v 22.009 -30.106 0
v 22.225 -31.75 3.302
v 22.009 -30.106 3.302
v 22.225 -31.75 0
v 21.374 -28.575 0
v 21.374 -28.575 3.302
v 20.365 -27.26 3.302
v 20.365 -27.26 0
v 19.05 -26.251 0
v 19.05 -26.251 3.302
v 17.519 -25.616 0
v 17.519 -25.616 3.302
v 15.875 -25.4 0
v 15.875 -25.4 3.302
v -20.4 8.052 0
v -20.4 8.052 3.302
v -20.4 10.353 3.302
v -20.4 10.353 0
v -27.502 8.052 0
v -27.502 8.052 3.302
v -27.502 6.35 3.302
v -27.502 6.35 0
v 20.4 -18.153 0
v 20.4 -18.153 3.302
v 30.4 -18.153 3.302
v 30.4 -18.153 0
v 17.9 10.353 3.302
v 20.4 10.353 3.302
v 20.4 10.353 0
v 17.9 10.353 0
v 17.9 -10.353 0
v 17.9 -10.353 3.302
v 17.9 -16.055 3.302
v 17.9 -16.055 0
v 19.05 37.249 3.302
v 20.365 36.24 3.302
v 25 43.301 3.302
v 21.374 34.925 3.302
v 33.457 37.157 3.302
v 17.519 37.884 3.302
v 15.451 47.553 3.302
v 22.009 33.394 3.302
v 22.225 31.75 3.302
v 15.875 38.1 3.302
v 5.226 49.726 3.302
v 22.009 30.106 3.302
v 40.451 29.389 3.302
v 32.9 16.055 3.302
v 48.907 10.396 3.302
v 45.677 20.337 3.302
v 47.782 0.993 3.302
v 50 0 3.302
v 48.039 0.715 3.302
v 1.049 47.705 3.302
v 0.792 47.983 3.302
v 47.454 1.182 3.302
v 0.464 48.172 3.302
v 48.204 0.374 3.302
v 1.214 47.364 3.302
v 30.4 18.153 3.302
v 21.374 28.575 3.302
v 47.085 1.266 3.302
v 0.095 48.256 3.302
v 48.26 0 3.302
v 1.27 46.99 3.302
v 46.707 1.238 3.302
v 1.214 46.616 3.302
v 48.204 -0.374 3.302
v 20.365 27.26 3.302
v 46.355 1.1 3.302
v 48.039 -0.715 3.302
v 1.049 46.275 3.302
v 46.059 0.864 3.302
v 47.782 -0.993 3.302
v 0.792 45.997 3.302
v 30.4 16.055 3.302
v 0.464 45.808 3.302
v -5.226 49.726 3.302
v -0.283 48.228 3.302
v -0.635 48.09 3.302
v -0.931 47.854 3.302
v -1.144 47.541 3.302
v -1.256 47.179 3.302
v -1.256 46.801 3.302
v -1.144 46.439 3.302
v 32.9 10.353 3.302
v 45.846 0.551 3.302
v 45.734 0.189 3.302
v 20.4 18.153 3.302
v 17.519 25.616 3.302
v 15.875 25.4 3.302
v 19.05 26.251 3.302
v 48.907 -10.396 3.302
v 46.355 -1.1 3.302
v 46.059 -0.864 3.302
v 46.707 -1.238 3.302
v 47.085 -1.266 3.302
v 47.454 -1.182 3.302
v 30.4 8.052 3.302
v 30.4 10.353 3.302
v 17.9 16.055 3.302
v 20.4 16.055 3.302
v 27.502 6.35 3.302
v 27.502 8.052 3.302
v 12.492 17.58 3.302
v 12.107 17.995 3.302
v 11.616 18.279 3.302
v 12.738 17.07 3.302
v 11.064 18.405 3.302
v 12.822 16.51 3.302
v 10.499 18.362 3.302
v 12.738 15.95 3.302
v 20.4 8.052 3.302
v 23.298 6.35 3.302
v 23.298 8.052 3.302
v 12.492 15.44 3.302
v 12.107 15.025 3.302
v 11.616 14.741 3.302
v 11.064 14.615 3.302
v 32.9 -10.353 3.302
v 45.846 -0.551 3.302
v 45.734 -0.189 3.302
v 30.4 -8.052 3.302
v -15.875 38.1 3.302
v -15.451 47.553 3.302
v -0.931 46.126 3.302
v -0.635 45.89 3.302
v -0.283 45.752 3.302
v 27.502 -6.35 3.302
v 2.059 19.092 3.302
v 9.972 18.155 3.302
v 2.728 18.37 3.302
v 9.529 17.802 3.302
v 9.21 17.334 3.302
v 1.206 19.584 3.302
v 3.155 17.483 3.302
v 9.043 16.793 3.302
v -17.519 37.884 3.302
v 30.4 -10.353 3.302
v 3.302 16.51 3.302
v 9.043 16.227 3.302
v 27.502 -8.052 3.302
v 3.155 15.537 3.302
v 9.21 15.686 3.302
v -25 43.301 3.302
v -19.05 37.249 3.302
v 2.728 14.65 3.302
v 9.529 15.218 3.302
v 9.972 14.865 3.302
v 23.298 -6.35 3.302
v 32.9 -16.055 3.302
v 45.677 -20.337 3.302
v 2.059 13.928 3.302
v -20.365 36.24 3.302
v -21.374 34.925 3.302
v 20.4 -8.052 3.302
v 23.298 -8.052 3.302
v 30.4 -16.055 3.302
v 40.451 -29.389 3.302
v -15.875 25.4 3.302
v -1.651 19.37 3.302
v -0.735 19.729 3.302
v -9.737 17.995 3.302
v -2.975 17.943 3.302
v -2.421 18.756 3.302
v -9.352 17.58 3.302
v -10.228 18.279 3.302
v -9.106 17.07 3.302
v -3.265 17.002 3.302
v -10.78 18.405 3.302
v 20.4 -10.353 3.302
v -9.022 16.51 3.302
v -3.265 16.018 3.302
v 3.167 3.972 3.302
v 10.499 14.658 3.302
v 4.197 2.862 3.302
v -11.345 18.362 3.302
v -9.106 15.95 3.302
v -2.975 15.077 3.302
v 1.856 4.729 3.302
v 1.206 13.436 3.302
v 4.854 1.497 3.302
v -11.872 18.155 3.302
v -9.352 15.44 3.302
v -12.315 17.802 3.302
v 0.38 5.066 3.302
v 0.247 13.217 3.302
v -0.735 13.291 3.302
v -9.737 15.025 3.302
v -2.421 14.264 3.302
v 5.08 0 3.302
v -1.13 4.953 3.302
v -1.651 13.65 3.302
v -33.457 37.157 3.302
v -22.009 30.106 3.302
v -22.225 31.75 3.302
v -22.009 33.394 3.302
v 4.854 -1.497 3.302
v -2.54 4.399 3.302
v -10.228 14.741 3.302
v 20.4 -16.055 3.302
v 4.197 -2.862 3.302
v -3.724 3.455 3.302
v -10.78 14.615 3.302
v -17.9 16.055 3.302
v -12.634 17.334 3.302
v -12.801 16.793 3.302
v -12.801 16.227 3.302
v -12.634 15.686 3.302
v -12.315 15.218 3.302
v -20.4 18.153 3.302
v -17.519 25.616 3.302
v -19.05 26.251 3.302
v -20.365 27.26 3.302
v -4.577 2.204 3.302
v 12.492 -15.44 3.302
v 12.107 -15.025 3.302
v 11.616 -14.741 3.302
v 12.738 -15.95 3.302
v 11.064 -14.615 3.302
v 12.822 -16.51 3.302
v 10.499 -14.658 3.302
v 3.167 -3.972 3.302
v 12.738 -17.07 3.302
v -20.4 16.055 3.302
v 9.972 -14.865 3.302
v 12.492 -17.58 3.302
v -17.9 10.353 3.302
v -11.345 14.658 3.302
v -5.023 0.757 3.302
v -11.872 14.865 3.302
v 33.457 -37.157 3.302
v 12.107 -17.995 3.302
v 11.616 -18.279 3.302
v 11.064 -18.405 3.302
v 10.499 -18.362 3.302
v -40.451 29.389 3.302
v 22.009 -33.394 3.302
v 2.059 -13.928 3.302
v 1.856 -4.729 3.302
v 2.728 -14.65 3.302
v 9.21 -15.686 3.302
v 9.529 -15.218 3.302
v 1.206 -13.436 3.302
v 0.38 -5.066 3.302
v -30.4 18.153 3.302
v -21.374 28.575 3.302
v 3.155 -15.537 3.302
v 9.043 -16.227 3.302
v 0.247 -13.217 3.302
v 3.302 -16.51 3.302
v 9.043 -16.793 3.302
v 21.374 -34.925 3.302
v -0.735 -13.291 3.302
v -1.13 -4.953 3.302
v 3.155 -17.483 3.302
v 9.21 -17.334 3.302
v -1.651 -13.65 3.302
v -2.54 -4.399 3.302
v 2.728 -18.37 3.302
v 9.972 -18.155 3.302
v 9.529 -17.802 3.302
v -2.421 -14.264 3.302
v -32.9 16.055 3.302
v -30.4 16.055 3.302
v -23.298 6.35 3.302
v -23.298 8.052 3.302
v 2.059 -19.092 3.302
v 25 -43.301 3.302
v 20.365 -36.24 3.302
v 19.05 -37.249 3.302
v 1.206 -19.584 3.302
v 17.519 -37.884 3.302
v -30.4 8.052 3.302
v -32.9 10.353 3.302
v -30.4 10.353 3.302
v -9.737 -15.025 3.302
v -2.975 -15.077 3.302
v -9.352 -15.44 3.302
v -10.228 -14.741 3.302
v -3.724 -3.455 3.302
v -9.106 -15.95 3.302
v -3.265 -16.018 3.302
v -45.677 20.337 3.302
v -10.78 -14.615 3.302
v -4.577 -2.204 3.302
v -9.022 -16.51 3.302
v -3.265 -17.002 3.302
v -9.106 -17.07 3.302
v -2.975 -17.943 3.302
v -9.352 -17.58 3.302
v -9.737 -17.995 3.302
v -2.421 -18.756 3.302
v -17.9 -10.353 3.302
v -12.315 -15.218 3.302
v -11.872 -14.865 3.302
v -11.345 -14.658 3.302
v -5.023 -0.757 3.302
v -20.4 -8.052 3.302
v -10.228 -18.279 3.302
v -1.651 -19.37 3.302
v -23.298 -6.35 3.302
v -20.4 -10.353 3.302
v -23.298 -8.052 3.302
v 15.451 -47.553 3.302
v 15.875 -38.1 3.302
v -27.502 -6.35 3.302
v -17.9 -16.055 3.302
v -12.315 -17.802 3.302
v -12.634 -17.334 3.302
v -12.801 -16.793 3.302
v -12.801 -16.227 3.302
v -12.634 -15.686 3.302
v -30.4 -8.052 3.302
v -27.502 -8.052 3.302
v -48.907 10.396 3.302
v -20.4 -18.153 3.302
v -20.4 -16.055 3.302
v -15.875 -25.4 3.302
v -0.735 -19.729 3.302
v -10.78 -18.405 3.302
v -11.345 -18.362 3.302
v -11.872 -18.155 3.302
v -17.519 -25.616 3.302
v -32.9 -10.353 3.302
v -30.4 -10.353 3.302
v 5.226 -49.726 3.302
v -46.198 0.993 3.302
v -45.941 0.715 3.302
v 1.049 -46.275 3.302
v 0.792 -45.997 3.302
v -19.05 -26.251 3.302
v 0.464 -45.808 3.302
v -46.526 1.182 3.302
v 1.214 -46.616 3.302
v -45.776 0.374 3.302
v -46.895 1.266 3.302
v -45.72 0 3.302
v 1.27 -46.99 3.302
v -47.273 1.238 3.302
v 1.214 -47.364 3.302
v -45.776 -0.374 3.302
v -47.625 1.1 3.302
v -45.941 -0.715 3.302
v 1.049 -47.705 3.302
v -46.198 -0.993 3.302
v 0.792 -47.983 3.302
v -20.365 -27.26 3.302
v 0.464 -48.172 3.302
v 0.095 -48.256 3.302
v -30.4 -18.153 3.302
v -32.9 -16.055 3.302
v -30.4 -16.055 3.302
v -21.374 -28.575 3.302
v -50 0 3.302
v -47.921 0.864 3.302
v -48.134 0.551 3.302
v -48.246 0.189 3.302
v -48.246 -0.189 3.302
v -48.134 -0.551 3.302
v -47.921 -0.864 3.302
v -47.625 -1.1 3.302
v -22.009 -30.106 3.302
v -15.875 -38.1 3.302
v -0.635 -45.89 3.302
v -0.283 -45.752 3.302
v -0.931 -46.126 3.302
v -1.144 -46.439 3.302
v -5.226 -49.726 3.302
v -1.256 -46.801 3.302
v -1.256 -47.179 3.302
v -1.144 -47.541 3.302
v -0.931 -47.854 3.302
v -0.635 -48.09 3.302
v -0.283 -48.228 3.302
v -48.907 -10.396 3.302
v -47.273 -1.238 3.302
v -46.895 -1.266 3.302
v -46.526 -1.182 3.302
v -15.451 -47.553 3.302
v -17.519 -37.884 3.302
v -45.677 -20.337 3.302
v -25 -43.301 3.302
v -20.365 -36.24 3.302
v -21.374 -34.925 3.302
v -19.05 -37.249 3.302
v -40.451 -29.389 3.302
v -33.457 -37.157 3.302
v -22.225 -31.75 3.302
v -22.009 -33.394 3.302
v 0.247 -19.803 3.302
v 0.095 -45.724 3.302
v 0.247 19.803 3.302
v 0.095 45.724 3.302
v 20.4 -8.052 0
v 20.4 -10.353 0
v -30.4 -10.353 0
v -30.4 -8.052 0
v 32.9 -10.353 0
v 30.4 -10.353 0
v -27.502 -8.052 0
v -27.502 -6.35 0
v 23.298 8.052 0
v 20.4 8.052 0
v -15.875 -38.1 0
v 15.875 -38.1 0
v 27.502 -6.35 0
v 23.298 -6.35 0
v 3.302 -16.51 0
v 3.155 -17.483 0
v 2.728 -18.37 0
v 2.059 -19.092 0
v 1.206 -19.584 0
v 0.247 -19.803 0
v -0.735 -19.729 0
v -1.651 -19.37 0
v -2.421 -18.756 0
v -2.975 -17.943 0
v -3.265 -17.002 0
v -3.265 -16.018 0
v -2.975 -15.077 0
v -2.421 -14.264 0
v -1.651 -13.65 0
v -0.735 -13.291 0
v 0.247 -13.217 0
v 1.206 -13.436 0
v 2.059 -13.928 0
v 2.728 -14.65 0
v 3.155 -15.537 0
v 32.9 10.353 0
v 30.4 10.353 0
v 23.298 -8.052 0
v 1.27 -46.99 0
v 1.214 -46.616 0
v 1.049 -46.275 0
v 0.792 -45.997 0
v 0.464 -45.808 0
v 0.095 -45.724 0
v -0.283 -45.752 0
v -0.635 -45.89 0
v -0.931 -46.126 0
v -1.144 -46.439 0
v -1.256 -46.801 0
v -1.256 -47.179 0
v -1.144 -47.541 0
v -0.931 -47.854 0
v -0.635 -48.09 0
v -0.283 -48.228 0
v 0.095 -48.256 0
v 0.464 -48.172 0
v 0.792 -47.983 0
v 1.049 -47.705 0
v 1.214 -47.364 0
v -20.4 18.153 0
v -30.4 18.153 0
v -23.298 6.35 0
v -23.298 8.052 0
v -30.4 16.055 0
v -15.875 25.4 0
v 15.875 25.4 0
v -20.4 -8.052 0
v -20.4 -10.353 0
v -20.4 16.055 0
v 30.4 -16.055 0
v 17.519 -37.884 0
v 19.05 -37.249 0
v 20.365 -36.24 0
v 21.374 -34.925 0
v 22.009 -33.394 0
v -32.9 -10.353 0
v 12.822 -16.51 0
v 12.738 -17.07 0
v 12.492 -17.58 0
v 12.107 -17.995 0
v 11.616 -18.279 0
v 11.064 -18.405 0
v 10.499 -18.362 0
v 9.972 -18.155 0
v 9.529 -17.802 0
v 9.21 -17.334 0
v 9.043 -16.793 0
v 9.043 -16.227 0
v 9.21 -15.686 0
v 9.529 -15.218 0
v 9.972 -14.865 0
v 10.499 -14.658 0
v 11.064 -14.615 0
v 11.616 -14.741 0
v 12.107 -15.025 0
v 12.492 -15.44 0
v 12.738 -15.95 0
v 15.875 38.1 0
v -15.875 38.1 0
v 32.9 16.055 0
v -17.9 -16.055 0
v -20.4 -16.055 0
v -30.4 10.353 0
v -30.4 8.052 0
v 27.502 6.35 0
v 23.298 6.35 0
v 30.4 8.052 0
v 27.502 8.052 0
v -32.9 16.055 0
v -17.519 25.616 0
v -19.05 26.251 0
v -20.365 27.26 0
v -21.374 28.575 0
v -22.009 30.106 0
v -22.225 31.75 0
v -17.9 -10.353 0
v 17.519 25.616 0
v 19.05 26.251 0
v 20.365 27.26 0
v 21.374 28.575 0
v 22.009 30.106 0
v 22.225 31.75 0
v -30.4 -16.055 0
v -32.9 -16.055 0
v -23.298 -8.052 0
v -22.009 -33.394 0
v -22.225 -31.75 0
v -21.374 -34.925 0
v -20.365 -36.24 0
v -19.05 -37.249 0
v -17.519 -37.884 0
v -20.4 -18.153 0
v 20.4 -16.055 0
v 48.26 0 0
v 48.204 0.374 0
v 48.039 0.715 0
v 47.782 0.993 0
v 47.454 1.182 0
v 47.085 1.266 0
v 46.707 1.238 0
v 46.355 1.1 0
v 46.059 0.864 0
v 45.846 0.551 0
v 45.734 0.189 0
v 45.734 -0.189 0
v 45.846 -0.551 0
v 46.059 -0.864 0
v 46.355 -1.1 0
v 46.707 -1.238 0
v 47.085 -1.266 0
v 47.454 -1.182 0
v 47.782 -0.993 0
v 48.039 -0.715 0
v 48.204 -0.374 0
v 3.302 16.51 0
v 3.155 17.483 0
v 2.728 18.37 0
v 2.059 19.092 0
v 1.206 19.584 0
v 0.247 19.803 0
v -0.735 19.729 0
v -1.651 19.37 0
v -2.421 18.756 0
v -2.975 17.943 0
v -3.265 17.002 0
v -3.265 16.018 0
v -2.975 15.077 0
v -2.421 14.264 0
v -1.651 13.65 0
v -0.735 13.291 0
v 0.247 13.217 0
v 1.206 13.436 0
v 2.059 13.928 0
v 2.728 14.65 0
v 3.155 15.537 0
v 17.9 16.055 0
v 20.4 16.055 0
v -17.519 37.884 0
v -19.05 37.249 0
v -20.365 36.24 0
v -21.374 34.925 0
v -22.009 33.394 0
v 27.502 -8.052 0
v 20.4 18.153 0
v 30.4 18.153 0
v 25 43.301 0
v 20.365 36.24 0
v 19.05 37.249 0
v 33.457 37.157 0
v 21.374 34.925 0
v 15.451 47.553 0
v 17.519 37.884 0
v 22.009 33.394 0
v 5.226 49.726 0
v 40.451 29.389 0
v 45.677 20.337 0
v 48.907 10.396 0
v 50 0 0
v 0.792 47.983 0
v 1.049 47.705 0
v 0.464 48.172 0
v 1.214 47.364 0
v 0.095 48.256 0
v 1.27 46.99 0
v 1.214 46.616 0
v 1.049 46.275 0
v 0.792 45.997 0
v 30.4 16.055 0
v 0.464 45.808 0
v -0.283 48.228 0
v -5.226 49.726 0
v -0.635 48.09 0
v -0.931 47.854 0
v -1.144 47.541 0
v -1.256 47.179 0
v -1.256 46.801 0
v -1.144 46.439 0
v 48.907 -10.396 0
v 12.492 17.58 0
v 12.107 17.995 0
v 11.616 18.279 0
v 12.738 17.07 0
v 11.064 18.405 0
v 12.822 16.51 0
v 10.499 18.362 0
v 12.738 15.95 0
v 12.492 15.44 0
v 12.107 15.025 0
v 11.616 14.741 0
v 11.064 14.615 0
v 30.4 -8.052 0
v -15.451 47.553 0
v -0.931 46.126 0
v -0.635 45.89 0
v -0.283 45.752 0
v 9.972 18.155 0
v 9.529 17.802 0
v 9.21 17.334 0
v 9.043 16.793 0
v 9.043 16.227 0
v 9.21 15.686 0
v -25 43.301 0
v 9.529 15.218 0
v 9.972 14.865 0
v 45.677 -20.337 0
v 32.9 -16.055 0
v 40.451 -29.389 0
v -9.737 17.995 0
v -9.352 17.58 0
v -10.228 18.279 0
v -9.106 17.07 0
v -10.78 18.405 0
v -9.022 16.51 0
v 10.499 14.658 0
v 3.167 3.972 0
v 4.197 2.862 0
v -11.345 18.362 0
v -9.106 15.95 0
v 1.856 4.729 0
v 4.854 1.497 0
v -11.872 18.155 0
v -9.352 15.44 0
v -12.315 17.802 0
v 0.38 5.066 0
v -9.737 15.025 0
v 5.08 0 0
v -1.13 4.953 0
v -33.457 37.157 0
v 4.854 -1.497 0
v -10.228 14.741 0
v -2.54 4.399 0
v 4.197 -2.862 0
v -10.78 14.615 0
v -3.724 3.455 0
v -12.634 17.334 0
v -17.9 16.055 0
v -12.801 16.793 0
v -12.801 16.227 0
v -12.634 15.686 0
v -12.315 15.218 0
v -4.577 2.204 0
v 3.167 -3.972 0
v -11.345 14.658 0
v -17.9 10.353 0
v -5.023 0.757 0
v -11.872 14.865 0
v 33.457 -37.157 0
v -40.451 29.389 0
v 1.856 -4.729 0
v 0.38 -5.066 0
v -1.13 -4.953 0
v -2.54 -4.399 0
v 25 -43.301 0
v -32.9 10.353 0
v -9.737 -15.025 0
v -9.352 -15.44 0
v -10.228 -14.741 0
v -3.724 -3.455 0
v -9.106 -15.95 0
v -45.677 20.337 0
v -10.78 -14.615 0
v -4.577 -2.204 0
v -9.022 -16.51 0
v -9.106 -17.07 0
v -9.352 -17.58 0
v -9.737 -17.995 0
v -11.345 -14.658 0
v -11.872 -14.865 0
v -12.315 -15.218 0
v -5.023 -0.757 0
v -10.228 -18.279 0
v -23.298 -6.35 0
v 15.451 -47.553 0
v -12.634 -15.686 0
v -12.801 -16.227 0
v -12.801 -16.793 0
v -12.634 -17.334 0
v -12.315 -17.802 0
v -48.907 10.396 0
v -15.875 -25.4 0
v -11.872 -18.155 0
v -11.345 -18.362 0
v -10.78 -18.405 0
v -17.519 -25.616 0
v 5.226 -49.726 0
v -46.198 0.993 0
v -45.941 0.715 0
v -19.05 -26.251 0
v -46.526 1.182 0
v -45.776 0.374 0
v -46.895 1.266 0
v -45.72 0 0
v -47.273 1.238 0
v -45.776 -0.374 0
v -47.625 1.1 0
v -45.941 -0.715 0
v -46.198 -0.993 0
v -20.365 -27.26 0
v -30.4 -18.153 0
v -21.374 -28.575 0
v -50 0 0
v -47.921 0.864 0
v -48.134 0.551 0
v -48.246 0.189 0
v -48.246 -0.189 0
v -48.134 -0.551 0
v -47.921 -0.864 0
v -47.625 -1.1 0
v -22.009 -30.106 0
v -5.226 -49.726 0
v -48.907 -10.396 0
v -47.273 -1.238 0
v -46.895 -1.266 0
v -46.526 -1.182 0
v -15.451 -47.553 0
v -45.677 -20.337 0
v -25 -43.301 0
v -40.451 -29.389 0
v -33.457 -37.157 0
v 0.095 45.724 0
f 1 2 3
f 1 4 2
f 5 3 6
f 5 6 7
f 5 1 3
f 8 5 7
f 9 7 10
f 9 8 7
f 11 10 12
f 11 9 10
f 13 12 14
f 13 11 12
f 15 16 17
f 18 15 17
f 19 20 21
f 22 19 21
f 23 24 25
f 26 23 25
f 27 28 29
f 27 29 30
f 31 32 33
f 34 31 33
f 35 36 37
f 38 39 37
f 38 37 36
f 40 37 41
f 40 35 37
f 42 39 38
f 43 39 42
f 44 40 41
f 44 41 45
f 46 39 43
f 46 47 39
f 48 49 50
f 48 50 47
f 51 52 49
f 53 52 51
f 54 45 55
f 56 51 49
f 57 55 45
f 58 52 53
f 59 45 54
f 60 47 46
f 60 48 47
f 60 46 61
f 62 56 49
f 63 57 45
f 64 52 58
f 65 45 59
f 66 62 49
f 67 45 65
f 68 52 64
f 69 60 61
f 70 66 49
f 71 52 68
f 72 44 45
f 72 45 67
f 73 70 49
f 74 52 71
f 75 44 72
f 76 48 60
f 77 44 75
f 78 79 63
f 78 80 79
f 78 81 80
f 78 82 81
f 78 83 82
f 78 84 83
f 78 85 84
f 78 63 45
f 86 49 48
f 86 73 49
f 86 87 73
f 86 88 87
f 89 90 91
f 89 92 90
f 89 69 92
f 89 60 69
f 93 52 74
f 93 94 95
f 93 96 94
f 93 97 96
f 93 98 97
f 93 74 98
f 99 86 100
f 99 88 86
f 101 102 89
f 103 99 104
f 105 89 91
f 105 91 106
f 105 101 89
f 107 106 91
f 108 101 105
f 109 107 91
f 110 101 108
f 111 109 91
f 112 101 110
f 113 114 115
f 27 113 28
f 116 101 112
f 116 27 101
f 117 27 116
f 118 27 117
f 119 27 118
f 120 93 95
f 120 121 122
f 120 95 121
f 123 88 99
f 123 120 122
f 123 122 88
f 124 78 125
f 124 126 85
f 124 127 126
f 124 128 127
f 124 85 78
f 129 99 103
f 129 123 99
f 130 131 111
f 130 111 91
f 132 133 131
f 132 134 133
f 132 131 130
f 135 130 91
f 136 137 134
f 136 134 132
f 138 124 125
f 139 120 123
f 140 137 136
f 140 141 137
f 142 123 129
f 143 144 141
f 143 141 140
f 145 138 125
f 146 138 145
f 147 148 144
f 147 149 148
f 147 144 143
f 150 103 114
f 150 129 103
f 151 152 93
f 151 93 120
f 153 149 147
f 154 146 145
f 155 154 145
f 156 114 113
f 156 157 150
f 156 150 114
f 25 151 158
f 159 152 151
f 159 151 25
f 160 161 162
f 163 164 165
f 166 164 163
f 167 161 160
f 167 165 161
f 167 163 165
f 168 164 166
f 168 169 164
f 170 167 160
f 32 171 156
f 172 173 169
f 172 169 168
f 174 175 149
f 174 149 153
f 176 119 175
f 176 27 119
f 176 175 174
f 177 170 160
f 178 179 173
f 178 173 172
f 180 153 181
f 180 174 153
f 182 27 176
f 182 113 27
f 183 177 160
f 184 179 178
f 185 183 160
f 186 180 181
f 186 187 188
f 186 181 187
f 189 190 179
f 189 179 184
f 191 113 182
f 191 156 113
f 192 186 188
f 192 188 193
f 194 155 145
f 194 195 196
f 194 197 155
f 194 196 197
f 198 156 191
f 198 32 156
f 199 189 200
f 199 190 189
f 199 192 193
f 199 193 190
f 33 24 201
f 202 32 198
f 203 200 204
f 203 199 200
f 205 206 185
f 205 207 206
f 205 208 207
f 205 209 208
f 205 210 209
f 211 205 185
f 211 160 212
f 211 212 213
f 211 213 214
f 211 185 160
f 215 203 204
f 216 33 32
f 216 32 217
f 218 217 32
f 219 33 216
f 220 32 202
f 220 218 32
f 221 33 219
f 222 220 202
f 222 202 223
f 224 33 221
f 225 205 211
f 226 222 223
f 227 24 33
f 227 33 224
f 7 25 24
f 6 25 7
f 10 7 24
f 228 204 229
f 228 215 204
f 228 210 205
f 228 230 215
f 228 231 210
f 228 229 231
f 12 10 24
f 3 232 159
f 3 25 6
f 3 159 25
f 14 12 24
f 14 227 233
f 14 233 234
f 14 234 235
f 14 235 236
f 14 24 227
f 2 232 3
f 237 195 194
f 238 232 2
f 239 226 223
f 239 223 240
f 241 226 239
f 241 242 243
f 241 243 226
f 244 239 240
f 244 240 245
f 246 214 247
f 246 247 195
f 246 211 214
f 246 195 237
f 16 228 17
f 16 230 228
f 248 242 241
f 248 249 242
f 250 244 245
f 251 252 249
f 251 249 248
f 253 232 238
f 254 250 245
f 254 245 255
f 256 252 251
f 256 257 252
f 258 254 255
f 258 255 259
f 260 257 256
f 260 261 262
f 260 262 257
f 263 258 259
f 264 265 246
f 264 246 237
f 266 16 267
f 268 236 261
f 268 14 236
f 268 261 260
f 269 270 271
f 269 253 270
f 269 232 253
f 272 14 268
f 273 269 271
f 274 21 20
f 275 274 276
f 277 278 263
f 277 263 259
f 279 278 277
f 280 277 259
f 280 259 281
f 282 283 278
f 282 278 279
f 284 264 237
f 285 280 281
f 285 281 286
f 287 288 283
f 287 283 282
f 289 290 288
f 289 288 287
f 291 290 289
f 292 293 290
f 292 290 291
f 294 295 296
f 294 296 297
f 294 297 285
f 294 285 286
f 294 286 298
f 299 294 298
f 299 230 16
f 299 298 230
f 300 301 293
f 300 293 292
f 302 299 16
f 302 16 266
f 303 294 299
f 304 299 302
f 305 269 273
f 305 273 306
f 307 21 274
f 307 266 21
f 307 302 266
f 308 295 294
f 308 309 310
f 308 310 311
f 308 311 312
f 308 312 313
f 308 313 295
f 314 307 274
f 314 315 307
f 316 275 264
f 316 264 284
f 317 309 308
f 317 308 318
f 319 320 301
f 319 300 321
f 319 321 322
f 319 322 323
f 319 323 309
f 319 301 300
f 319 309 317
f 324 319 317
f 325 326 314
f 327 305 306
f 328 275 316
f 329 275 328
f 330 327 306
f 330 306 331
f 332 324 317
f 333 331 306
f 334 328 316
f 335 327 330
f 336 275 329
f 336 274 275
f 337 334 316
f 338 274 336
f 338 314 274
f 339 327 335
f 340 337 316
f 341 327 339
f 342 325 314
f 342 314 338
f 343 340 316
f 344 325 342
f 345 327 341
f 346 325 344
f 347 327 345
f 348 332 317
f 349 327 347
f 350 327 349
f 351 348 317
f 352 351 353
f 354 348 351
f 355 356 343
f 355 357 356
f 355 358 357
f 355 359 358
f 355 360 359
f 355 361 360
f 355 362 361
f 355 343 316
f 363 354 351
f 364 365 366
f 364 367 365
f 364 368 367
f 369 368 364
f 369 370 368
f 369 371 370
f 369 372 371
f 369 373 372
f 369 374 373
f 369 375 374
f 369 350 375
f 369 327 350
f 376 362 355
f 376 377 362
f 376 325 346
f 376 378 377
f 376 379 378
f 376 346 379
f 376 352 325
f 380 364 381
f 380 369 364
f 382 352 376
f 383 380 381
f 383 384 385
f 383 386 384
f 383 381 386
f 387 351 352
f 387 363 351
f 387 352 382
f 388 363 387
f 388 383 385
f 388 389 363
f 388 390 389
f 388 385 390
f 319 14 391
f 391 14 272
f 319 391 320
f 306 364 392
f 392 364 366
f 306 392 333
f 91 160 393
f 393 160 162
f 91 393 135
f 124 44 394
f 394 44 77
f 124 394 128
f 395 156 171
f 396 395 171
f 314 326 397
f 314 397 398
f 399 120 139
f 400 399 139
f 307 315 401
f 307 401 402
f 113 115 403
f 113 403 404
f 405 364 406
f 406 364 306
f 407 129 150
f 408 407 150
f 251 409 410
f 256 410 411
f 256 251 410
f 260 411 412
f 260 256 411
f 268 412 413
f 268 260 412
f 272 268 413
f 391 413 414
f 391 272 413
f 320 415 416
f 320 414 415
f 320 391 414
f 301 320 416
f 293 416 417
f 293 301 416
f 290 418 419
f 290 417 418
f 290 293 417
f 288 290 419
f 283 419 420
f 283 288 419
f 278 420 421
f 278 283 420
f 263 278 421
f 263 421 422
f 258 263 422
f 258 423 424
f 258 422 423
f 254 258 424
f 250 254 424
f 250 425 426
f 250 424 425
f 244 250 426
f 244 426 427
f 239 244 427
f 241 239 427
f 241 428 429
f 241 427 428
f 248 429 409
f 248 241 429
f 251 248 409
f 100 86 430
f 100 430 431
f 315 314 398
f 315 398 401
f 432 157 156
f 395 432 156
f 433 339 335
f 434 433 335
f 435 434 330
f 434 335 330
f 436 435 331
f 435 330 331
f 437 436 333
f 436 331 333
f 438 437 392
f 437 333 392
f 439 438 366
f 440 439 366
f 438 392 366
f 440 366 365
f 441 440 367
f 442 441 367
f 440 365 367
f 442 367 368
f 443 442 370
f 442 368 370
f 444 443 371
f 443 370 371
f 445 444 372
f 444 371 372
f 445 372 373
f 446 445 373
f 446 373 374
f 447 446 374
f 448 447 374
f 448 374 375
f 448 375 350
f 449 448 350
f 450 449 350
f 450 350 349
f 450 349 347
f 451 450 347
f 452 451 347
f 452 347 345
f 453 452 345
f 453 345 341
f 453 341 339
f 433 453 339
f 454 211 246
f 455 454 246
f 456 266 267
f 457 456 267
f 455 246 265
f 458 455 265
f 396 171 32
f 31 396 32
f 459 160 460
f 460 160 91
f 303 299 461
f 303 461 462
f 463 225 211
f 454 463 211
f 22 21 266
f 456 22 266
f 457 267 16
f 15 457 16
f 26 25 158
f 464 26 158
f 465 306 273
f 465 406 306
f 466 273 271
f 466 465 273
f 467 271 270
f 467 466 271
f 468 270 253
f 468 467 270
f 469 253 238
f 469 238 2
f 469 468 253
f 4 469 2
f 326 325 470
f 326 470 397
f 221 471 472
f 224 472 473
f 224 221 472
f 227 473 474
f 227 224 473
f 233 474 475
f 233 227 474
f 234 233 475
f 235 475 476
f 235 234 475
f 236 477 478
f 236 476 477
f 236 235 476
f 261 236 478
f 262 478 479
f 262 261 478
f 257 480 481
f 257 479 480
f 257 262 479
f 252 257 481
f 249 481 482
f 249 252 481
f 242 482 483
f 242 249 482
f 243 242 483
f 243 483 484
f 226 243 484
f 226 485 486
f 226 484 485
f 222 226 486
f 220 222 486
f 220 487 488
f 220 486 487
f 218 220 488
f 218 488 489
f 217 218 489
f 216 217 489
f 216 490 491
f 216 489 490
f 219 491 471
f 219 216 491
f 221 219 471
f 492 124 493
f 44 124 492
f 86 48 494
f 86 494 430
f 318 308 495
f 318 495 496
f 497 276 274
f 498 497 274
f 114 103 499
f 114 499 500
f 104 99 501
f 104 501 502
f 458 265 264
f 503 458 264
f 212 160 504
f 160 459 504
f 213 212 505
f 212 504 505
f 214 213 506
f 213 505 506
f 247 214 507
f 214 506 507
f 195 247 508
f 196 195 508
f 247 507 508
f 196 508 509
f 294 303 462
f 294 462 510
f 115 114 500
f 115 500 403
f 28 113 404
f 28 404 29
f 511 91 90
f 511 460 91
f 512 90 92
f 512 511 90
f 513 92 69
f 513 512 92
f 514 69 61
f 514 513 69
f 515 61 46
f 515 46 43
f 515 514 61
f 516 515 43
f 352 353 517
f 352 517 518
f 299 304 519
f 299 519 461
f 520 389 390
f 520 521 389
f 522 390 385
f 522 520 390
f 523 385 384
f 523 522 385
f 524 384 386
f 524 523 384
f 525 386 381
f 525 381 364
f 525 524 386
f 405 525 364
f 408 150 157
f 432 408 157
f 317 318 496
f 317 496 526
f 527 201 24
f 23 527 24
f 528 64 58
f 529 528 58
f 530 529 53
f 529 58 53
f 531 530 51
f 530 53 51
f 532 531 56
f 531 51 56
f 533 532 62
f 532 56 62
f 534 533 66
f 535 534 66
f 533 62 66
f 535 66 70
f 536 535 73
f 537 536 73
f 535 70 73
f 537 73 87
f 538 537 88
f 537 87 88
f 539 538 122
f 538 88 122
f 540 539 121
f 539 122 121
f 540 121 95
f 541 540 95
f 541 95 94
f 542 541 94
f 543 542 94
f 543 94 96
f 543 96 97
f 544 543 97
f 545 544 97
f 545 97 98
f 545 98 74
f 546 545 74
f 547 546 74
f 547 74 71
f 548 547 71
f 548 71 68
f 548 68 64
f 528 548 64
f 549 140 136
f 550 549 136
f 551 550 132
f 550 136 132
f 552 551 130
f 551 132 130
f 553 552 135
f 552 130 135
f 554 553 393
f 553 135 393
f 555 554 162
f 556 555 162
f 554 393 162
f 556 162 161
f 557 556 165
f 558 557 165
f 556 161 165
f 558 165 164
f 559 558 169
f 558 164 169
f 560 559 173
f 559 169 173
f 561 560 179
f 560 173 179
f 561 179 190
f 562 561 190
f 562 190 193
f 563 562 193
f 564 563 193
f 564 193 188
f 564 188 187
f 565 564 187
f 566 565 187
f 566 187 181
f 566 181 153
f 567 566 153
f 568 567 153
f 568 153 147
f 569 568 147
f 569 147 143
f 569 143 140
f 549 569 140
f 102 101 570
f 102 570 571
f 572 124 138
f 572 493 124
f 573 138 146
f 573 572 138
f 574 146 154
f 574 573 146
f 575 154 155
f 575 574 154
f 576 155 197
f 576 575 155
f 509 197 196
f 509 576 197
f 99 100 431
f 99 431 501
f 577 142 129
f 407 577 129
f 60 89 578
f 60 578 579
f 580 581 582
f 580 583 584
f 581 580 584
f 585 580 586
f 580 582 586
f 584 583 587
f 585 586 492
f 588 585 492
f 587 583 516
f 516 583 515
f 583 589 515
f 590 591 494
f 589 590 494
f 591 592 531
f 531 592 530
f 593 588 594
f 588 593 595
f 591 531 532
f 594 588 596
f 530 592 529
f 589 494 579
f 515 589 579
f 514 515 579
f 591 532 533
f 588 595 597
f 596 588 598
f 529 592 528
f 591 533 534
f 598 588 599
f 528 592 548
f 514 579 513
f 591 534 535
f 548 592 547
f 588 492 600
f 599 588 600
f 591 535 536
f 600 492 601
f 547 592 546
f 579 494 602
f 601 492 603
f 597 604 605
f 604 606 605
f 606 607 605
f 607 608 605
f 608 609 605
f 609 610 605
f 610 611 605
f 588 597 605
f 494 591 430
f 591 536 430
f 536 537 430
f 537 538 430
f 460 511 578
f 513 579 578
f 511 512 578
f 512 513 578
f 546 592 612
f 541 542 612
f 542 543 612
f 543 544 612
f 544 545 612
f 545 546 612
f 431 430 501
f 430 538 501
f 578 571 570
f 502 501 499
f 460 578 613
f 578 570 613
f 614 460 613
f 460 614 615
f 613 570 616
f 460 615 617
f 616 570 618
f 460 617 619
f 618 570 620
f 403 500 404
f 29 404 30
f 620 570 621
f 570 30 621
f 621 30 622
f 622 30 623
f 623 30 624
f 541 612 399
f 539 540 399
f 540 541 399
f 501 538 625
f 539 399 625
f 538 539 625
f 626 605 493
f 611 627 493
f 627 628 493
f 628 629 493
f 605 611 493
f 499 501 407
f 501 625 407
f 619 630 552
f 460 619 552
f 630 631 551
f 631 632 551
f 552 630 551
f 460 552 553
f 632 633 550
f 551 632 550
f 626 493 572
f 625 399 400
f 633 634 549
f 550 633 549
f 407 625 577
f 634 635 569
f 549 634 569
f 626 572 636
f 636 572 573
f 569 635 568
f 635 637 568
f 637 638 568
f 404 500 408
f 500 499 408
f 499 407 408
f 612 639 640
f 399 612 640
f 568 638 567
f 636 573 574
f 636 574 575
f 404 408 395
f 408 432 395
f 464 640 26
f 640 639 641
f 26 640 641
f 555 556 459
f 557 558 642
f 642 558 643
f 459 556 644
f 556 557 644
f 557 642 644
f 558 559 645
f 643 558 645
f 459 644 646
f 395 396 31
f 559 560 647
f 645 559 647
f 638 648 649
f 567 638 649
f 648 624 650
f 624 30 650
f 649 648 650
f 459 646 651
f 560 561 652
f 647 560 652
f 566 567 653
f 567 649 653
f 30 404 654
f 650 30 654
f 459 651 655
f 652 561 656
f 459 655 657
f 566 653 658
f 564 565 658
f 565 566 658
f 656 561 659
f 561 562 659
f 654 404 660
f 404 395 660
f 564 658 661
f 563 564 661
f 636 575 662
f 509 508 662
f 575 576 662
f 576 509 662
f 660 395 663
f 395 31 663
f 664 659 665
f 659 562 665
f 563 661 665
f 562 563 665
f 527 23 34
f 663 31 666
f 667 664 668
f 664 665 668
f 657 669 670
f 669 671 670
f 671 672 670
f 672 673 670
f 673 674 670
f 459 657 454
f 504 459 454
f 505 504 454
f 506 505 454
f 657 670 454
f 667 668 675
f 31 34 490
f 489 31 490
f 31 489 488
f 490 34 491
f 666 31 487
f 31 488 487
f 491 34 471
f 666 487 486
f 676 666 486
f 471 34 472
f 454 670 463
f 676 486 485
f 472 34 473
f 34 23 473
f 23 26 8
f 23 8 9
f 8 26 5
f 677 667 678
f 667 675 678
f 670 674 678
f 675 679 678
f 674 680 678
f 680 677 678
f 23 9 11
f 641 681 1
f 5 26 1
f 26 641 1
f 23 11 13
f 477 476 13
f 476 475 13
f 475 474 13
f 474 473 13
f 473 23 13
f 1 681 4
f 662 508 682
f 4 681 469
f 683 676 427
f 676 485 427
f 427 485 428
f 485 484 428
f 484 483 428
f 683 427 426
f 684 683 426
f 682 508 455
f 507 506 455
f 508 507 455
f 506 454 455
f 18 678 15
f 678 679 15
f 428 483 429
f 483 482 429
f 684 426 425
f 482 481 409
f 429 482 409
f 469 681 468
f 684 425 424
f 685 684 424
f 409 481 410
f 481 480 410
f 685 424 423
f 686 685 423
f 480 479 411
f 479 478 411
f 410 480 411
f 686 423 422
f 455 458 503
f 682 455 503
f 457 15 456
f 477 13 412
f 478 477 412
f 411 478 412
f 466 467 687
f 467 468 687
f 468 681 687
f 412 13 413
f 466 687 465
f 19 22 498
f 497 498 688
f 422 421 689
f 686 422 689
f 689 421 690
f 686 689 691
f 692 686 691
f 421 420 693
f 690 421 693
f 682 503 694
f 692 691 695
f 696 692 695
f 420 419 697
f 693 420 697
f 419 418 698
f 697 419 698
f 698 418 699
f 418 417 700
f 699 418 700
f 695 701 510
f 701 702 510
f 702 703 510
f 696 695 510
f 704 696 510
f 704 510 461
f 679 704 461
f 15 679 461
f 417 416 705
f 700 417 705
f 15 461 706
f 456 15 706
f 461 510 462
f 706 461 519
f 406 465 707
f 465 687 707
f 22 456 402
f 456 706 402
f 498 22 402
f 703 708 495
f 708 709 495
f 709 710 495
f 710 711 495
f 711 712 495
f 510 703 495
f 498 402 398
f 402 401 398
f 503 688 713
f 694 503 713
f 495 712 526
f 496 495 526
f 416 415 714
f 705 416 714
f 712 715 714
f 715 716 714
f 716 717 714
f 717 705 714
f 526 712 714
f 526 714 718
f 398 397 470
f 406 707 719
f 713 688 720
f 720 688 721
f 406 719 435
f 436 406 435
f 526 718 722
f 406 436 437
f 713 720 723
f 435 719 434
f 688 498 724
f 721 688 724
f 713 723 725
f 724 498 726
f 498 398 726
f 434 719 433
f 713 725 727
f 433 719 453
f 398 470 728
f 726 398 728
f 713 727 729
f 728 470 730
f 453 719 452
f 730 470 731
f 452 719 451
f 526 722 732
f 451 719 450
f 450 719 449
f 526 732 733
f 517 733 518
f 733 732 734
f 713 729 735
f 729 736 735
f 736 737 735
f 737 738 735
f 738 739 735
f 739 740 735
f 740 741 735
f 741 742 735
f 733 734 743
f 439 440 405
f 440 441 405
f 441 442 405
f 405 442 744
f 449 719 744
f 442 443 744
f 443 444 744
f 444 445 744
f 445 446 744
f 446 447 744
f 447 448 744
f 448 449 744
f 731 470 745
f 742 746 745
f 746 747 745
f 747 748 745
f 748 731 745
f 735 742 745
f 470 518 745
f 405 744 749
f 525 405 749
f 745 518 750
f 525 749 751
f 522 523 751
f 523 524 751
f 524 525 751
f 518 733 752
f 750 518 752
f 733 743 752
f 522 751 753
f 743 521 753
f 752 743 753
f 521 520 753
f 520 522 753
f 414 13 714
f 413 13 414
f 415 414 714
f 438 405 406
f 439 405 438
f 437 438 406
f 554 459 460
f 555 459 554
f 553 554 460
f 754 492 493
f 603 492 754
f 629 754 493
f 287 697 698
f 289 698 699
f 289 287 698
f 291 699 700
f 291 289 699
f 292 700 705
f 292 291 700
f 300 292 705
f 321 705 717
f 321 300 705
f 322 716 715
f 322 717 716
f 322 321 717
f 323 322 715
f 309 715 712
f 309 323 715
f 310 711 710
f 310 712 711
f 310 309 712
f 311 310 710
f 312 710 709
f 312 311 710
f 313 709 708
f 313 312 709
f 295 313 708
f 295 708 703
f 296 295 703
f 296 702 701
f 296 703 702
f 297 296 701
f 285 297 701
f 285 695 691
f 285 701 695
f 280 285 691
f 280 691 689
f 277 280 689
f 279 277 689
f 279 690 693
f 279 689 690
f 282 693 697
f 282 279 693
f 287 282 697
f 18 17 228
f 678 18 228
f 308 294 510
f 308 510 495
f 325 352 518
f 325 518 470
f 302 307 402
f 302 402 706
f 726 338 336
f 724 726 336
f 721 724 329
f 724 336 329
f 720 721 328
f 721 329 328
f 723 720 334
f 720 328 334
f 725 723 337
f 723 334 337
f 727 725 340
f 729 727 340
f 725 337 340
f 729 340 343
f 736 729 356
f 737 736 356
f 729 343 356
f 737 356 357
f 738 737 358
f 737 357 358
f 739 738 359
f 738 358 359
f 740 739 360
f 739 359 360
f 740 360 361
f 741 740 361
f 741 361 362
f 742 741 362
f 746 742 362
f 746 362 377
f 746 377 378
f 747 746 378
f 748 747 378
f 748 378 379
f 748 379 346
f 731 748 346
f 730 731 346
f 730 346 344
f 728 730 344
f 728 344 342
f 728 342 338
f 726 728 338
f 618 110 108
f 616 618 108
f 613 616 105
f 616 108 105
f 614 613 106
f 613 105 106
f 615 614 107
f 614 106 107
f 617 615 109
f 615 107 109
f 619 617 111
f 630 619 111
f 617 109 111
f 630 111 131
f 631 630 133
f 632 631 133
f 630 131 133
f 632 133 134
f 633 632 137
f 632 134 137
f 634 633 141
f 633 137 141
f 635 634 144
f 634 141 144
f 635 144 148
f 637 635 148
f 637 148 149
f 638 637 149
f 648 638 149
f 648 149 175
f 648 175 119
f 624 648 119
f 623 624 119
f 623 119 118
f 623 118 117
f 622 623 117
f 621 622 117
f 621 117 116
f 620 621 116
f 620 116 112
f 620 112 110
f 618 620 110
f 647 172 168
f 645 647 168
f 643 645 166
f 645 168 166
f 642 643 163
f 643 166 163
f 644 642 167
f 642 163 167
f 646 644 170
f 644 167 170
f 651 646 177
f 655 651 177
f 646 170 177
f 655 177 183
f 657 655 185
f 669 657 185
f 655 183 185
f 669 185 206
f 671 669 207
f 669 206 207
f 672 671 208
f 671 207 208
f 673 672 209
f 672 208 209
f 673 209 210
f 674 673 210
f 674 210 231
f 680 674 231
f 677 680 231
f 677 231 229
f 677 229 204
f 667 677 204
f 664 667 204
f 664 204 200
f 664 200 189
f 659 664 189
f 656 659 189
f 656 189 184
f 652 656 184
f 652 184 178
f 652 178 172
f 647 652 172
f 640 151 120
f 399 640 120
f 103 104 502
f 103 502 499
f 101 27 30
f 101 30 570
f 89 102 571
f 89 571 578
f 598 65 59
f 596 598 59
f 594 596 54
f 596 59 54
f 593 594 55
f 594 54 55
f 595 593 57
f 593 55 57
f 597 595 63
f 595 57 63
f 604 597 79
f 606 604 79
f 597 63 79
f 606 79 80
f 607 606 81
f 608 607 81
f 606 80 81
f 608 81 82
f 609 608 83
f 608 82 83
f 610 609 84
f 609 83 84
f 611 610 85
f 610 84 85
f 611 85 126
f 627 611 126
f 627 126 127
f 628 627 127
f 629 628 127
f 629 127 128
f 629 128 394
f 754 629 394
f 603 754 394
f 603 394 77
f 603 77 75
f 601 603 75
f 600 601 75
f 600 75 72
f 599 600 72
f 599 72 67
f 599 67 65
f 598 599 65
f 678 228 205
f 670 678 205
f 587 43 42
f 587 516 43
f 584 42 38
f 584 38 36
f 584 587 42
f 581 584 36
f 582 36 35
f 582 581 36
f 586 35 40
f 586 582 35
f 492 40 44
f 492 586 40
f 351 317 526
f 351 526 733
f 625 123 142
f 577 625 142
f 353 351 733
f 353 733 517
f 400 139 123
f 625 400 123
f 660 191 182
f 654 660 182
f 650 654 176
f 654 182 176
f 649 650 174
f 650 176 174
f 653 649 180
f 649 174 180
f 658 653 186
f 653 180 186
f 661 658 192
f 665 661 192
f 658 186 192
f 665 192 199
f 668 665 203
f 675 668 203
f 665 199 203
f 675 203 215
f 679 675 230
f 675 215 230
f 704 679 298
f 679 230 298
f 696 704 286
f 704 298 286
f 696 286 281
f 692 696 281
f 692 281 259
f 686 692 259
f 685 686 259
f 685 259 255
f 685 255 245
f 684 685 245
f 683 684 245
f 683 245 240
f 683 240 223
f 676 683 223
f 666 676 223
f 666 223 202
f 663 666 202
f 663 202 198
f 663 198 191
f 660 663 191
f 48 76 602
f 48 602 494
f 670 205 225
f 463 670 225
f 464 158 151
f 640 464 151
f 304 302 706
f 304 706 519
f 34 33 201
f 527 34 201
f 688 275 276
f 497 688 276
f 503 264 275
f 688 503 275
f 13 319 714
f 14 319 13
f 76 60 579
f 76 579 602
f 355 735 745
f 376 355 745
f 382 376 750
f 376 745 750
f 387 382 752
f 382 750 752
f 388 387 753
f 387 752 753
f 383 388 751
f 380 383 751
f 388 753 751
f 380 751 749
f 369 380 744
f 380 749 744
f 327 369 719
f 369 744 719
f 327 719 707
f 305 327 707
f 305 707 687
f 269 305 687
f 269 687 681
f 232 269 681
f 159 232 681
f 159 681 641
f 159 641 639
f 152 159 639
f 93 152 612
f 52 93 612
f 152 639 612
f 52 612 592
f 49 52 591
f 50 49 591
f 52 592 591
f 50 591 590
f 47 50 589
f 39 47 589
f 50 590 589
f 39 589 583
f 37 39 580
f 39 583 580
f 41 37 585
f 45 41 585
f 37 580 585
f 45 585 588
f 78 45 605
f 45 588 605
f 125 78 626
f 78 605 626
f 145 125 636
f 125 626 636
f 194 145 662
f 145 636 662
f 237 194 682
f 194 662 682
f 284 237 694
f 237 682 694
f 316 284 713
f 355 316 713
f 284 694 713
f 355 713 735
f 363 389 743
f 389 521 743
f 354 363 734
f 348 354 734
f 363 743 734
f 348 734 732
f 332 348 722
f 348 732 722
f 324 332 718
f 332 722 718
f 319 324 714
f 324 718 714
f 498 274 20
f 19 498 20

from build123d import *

# Parameters (mm, degrees)
SKETCH_1_R           = 50
EXTRUDE_1_DEPTH      = 3.302
SKETCH_4_R           = 5.08
CUT_EXTRUDE_3_DEPTH  = 71.787733429
SKETCH_7_R           = 1.27
CUT_EXTRUDE_6_DEPTH  = 71.787733429
SKETCH3_R            = 3.302
SKETCH3_R_2          = 1.9
CUT_EXTRUDE1_DEPTH   = 71.787733429
CUT_EXTRUDE4_DEPTH   = 71.787733429
MIRROR5_COPY_1_DEPTH = 71.787733429
SKETCH11_W           = 44.45
SKETCH11_H           = 12.7
CUT_EXTRUDE5_DEPTH   = 71.787733429
FILLET1_R            = 6.35
FILLET1_OF_MIRROR6_R = 6.35


with BuildPart() as part:
    # 草图1 → 凸台-拉伸1 (new body)
    with BuildSketch(Plane.XY):
        with Locations(Location((0, 0, 0), (0, 0, 180))):
            Circle(SKETCH_1_R)
    extrude(amount=EXTRUDE_1_DEPTH)

    # 草图4 → 切除-拉伸3 (cut, through all)
    with BuildSketch(Plane.XY.offset(3.302)):
        Circle(SKETCH_4_R)
    extrude(amount=-CUT_EXTRUDE_3_DEPTH, mode=Mode.SUBTRACT)

    # 草图7 → 切除-拉伸6 (cut, through all)
    with BuildSketch(Plane.XY.offset(3.302)):
        with Locations((0, 46.99)):
            Circle(SKETCH_7_R)
        with Locations((46.99, 0)):
            Circle(SKETCH_7_R)
        with Locations((0, -46.99)):
            Circle(SKETCH_7_R)
        with Locations((-46.99, 0)):
            Circle(SKETCH_7_R)
    extrude(amount=-CUT_EXTRUDE_6_DEPTH, mode=Mode.SUBTRACT)

    # Sketch3 → Cut-Extrude1 (cut, through all)
    with BuildSketch(Plane.XY.offset(3.302)):
        with Locations((0, 16.51)):
            Circle(SKETCH3_R)
        with Locations((10.922, 16.51)):
            Circle(SKETCH3_R_2)
        with Locations((-10.922, 16.51)):
            Circle(SKETCH3_R_2)
    cut_extrude1 = extrude(amount=-CUT_EXTRUDE1_DEPTH, mode=Mode.SUBTRACT)

    # Mirror3: Cut-Extrude1 across plane
    add(cut_extrude1.mirror(Plane.ZX), mode=Mode.SUBTRACT)

    # Sketch10 → Cut-Extrude4 (cut, through all)
    with BuildSketch(Plane.XY.offset(3.302)):
        Polygon((-20.4, -18.153199914), (-30.4, -18.153199914), (-30.4, -16.054784248), (-32.9, -16.054784248), (-32.9, -10.353195448), (-30.4, -10.353195448), (-30.4, -8.051599848), (-27.501596, -8.051599848), (-27.501596, -6.35), (-23.298404, -6.35), (-23.298404, -8.051599848), (-20.4, -8.051599848), (-20.4, -10.353195448), (-17.9, -10.353195448), (-17.9, -16.054784248), (-20.4, -16.054784248), align=None)
    cut_extrude4 = extrude(amount=-CUT_EXTRUDE4_DEPTH, mode=Mode.SUBTRACT)

    # Mirror4: Cut-Extrude4 across plane
    add(cut_extrude4.mirror(Plane.ZX), mode=Mode.SUBTRACT)

    # Mirror5: Cut-Extrude4 across plane
    add(cut_extrude4.mirror(Plane(origin=(0, 0, 0), x_dir=(0, 0, 1), z_dir=(1, 0, 0))), mode=Mode.SUBTRACT)

    # Mirror5 copy 1 sketch → Mirror5 copy 1 (cut, through all)
    with BuildSketch(Plane(origin=(0, 0, 3.302), x_dir=(-1, 0, 0), z_dir=(0, 0, 1))):
        Polygon((-20.4, -18.153199914), (-30.4, -18.153199914), (-30.4, -16.054784248), (-32.9, -16.054784248), (-32.9, -10.353195448), (-30.4, -10.353195448), (-30.4, -8.051599848), (-27.501596, -8.051599848), (-27.501596, -6.35), (-23.298404, -6.35), (-23.298404, -8.051599848), (-20.4, -8.051599848), (-20.4, -10.353195448), (-17.9, -10.353195448), (-17.9, -16.054784248), (-20.4, -16.054784248), align=None)
    extrude(amount=-MIRROR5_COPY_1_DEPTH, mode=Mode.SUBTRACT)

    # Sketch11 → Cut-Extrude5 (cut, through all)
    with BuildSketch(Plane.XY.offset(3.302)):
        with Locations((0, 31.75)):
            Rectangle(SKETCH11_W, SKETCH11_H)
    cut_extrude5 = extrude(amount=-CUT_EXTRUDE5_DEPTH, mode=Mode.SUBTRACT)

    # Fillet1
    fillet1_edges = [part.edges().sort_by_distance(p)[0] for p in [
        (22.225, 25.4, 1.651),
        (22.225, 38.1, 1.651),
        (-22.225, 38.1, 1.651),
        (-22.225, 25.4, 1.651),
    ]]
    fillet(fillet1_edges, radius=FILLET1_R - 0.0001)  # a hair under: the kernel refuses the full size

    # Mirror6: Cut-Extrude5 across plane
    add(cut_extrude5.mirror(Plane.ZX), mode=Mode.SUBTRACT)

    # Fillet1 of Mirror6
    fillet1_of_mirror6_edges = [part.edges().sort_by_distance(p)[0] for p in [
        (22.225, -25.4, 1.651),
        (22.225, -38.1, 1.651),
        (-22.225, -38.1, 1.651),
        (-22.225, -25.4, 1.651),
    ]]
    fillet(fillet1_of_mirror6_edges, radius=FILLET1_OF_MIRROR6_R - 0.0001)  # a hair under: the kernel refuses the full size


solid = part.part
